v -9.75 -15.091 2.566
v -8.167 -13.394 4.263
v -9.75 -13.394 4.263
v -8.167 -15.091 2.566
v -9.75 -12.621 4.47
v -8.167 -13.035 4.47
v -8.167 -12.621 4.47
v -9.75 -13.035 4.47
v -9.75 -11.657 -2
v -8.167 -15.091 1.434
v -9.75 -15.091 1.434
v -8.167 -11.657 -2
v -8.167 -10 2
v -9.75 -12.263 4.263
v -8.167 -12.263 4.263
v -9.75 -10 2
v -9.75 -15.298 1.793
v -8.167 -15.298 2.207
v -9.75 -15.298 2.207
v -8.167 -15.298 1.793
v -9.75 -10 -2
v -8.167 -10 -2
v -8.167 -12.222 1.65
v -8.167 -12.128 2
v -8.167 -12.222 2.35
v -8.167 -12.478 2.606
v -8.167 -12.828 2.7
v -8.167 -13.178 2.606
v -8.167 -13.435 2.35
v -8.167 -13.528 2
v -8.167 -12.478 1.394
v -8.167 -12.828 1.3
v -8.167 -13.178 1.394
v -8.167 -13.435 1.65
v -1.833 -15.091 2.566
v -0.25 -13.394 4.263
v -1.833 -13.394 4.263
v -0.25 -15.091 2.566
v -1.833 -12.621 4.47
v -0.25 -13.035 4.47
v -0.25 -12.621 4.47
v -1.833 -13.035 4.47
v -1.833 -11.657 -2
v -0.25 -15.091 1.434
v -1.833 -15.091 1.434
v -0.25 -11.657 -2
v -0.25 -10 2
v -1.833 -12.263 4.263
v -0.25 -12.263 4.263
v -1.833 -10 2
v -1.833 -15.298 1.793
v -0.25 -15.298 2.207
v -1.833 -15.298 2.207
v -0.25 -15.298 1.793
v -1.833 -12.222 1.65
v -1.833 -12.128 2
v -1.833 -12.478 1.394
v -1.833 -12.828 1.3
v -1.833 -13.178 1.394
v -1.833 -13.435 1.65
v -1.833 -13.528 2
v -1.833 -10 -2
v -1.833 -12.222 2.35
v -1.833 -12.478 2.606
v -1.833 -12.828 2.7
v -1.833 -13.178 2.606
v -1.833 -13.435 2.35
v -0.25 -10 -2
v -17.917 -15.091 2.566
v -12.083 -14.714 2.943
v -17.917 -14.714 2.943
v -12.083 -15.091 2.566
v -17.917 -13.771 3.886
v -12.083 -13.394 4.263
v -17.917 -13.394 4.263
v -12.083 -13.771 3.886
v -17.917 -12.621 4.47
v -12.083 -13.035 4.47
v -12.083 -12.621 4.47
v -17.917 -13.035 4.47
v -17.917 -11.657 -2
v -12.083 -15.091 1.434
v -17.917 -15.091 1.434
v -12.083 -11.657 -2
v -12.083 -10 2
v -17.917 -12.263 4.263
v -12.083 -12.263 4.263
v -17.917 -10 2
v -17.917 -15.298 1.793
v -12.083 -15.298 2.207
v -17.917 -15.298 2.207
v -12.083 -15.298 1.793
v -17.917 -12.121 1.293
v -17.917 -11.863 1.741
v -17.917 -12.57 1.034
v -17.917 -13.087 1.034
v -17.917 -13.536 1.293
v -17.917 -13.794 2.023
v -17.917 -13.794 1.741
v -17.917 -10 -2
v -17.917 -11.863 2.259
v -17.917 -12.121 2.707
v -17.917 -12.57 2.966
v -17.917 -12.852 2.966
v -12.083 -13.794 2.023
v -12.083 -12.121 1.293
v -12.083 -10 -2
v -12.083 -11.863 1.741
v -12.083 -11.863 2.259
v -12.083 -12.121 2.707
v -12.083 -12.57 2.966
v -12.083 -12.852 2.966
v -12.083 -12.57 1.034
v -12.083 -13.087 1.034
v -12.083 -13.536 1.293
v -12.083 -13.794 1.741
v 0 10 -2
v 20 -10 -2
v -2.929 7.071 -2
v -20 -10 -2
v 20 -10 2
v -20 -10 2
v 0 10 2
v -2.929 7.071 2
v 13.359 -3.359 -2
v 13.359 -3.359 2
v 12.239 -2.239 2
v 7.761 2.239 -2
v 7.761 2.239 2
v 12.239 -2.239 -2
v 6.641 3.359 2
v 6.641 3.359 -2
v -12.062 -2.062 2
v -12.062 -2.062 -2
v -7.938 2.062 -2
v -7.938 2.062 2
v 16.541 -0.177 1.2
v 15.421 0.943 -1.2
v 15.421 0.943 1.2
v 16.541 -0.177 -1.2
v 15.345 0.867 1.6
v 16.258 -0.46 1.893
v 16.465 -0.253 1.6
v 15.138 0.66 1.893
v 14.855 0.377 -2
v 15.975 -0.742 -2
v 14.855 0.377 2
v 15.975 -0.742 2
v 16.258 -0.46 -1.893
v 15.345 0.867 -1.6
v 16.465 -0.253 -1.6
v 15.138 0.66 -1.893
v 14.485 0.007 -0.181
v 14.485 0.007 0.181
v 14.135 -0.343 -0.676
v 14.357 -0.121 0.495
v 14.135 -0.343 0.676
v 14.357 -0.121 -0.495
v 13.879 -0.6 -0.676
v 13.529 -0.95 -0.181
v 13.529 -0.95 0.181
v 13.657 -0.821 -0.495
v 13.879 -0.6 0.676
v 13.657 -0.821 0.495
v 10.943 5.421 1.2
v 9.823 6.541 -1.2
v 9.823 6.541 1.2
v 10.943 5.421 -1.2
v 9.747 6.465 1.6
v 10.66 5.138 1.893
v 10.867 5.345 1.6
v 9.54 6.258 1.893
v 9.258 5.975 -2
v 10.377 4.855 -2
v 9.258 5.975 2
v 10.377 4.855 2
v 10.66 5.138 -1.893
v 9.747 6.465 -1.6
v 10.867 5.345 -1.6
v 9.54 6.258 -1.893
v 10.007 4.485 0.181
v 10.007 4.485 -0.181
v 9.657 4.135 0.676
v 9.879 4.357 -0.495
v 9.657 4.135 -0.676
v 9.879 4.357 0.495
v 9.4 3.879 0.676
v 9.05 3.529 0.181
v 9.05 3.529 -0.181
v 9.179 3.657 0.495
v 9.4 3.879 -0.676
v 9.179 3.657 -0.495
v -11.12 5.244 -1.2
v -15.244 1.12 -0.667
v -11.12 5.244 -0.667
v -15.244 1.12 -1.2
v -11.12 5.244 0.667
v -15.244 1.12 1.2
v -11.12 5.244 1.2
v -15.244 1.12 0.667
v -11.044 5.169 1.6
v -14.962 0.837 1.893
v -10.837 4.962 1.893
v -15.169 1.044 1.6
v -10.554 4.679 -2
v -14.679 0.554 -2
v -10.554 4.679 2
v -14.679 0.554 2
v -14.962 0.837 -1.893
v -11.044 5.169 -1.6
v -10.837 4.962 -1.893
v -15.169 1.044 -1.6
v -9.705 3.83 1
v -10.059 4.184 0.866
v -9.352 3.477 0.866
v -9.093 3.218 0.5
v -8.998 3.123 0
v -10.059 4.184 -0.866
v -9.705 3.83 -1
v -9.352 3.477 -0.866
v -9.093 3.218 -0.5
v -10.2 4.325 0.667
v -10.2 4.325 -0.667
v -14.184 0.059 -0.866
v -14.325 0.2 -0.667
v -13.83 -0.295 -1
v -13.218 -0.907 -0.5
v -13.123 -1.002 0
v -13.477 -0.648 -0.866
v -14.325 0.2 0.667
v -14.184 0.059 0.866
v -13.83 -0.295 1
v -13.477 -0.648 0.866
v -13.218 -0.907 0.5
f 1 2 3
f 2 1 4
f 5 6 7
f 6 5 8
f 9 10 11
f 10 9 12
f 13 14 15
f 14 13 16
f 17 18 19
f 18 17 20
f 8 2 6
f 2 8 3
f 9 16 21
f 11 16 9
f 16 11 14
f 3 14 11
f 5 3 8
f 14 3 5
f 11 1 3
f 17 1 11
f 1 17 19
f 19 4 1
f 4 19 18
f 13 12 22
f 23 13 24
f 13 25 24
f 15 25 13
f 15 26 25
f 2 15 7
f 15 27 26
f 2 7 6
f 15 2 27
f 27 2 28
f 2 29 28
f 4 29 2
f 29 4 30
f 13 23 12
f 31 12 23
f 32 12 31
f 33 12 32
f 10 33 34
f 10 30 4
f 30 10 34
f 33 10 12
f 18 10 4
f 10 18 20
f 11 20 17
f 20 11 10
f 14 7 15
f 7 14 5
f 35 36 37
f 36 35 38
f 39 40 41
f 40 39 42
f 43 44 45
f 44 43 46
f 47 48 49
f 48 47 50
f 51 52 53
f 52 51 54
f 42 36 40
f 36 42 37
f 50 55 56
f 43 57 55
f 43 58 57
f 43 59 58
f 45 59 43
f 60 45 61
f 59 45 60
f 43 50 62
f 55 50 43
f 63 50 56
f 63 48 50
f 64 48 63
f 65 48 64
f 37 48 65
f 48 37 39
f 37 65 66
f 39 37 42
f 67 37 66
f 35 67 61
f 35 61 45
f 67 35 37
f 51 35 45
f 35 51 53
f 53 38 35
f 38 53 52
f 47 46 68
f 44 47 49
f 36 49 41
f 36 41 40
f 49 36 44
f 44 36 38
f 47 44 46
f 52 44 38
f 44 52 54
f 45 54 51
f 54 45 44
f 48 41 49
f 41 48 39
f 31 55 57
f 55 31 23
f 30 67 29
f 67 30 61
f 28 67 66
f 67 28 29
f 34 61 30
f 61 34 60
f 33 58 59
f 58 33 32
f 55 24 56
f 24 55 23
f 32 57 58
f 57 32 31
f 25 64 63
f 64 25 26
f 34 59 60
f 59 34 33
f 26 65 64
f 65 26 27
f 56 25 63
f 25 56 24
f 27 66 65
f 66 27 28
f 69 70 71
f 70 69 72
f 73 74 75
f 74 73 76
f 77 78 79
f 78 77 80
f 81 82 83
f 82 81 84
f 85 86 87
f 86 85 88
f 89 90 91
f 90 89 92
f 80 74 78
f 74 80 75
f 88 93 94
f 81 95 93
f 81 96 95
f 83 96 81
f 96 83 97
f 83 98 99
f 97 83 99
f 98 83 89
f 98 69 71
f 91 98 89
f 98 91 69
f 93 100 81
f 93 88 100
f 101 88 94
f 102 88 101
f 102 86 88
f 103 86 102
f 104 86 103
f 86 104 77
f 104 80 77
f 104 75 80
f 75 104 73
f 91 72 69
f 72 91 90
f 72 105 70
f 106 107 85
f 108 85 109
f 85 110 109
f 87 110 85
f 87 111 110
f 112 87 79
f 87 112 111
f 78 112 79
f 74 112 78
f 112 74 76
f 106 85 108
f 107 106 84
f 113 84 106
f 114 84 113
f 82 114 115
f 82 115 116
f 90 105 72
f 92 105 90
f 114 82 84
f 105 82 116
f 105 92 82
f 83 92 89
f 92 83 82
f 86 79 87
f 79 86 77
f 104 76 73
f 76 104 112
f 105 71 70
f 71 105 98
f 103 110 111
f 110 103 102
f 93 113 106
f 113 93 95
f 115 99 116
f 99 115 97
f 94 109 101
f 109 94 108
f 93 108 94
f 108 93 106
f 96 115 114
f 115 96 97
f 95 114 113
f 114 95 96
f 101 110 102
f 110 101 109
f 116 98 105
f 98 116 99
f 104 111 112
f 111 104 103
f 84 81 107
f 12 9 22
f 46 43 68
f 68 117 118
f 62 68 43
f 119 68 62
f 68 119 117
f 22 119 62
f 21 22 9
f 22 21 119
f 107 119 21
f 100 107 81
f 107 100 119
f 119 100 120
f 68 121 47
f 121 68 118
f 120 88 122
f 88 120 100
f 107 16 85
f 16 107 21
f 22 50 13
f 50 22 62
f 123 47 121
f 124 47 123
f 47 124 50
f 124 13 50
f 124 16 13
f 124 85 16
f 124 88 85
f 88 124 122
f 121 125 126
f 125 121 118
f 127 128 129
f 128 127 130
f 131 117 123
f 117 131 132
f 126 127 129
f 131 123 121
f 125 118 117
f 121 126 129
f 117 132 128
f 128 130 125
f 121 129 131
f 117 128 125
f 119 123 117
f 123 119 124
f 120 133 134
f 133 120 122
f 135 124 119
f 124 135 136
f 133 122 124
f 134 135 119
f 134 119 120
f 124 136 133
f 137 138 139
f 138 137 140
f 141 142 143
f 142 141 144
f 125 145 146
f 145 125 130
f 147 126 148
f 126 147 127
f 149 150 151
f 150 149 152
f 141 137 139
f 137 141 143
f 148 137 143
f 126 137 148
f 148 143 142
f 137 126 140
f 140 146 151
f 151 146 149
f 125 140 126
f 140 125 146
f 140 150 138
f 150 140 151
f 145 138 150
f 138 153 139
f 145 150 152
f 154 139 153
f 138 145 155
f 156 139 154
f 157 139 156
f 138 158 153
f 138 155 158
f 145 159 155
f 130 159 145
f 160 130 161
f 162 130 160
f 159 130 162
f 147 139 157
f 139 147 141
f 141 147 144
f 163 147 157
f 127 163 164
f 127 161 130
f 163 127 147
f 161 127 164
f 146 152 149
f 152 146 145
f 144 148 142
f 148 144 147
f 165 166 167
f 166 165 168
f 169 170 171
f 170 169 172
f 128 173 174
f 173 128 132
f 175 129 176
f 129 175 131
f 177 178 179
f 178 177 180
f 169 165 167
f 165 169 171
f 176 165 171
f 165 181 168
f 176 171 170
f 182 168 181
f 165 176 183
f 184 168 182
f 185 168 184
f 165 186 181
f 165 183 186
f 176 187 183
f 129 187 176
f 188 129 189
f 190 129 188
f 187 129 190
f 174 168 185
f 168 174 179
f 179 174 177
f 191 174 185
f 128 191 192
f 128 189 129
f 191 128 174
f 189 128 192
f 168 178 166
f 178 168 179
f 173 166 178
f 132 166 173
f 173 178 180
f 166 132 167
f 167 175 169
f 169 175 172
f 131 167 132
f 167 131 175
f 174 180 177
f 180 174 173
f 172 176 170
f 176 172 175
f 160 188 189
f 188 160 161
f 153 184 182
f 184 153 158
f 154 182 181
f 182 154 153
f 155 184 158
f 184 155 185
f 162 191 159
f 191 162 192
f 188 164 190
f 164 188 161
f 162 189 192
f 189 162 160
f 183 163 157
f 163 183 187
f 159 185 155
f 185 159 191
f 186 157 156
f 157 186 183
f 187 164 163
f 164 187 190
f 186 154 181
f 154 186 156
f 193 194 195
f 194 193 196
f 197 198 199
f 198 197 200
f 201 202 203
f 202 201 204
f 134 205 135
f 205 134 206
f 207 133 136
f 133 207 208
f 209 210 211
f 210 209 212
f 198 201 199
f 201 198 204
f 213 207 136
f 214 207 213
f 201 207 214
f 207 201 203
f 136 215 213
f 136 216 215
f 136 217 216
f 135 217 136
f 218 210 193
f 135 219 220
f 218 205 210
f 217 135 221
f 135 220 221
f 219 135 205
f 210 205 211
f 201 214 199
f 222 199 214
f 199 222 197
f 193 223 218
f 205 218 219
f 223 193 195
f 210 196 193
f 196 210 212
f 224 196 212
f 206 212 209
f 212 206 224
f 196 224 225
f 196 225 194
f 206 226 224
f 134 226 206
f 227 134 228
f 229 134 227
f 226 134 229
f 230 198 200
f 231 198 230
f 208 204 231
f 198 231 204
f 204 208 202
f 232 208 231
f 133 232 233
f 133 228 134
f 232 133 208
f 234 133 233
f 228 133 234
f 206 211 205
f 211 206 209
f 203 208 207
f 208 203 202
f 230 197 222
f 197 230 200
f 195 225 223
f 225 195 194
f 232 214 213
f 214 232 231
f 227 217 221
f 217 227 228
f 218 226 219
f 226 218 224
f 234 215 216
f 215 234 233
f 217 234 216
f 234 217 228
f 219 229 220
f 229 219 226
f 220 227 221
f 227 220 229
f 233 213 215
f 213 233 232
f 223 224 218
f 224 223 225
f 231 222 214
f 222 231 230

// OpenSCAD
// file: clip.scad
include <vars.scad>;

module clip(){
  tollerance = 0.9;
  max_width = JOINT_WIDTH - JOINT_TOLLERANCE; 
  hinge_side = max_width/6;
  width = (max_width-hinge_side*2) - JOINT_TOLLERANCE;
  size = TRIANGLE_THICKNESS;
  corner = 0.8;

  echo("clip width:", width);
    
  difference() {
    hull() {
      translate([0, size, 0]) {
        cube([width, size, size], center=true);
      }
      translate([0, -size/2+corner, size/2-corner]) {
        rotate(90, [0, 1, 0]) {
          cylinder(h=width, r=corner, center=true);
        }
      }
      translate([0, -size/2+corner, -size/2+corner]) {
        rotate(90, [0, 1, 0]) {
          cylinder(h=width, r=corner, center=true);
        }
      }
    }
    translate([0, -size/2, 0]) {
      cube([JOINT_WIDTH, size, size/3], center=true);
    }
    rotate(90, [0, 1, 0]) {
      cylinder(h=JOINT_WIDTH, r=size/2*1/2, center=true);
    }
  }
}

color(COLOR, 1) {
  clip();
}
// file: hinge.scad
include <vars.scad>;

FACE_ANGLE = 360/$fn;

module hinge(){
  width = JOINT_WIDTH-JOINT_TOLLERANCE;
  size = TRIANGLE_THICKNESS;
  side = width/6;
  corner = 0.8;
  
  echo("hinge widths (all, side, cylinder):", width, side, width-side*2);
    
  hull() {
    translate([-(width/2)+side/2, size, 0]) {
      cube([side, size, size], center=true);
    }
    translate([-(width/2)+side/2, -size/2+corner, size/2-corner]) {
      rotate(90, [0, 1, 0]) {
        cylinder(h=side, r=corner, center=true);
      }
    }
    translate([-(width/2)+side/2, -size/2+corner, -size/2+corner]) {
      rotate(90, [0, 1, 0]) {
        cylinder(h=side, r=corner, center=true);
      }
    }
  }
  hull() {
    translate([width/2-side/2, size, 0]) {
      cube([side, size, size], center=true);
    } 
    translate([width/2-side/2, -size/2+corner, size/2-corner]) {
      rotate(90, [0, 1, 0]) {
        cylinder(h=side, r=corner, center=true);
      }
    }
    translate([width/2-side/2, -size/2+corner, -size/2+corner]) {
      rotate(90, [0, 1, 0]) {
        cylinder(h=side, r=corner, center=true);
      }
    }
  }
  rotate(FACE_ANGLE/2, [1, 0, 0]) { // Required so that cylinder face is parallel to plane
    rotate(90, [0, 1, 0]) {
      cylinder(h=width, r=size/2*0.7/2, center=true);
    }
  }
} 

color(COLOR, 1) {
  hinge();
}
// file: triangle.scad
include <vars.scad>;

module triangle(){
  translate([0, 0, -TRIANGLE_THICKNESS/2]) {
    linear_extrude(TRIANGLE_THICKNESS) {
      polygon([[-TRIANGLE_SIDE/2, -TRIANGLE_SIDE/4], [0, TRIANGLE_SIDE/4], [TRIANGLE_SIDE/2, -TRIANGLE_SIDE/4]]);
    }
  }
}

color(COLOR, 1) {
  triangle();
}
// file: vars.scad
$fn = 12;
COLOR = "LimeGreen"; // Model color
TRIANGLE_SIDE = 40; // Triangle side size
TRIANGLE_THICKNESS = 4; // Triagle thickness
JOINT_WIDTH = TRIANGLE_SIDE/4; // Max width for clip/hinge
JOINT_TOLLERANCE = 0.5; // Fixed joint tollerance
// main file
include <vars.scad>;
use <triangle.scad>;
use <hinge.scad>;
use <clip.scad>;

module part() {
  difference() {
    union(){
      triangle();
      translate([-TRIANGLE_SIDE/8, -TRIANGLE_SIDE/4, 0]) {
        translate([0, 0, TRIANGLE_THICKNESS/2]) {
          rotate(-45, [1, 0, 0]) {
            translate([0, -TRIANGLE_THICKNESS/2, -TRIANGLE_THICKNESS/2]) {
              hinge();
            }
          }
        }
      }
      translate([-TRIANGLE_SIDE/8*3, -TRIANGLE_SIDE/4, 0]) {
        translate([0, 0, TRIANGLE_THICKNESS/2]) {
          rotate(-45, [1, 0, 0]) {
            translate([0, -TRIANGLE_THICKNESS/2, -TRIANGLE_THICKNESS/2]) {
              clip();
            }
          }
        }
      }
    }
    translate([0, 0, -TRIANGLE_THICKNESS]) {
      cube([TRIANGLE_SIDE*2, TRIANGLE_SIDE*2, TRIANGLE_THICKNESS], center=true);
    }
    translate([-TRIANGLE_SIDE/4, 0, 0]) {
      rotate(-45, [0,0,1]){
        translate([-TRIANGLE_THICKNESS, -TRIANGLE_SIDE+TRIANGLE_SIDE/4, -TRIANGLE_THICKNESS/2]) {
          cube([TRIANGLE_THICKNESS, TRIANGLE_SIDE, TRIANGLE_THICKNESS], center=false);
        }
      }
    }
  }
  translate([TRIANGLE_SIDE/4, 0, 0]) {
    rotate(135, [0, 0, 1]) {
      translate([0, -TRIANGLE_THICKNESS/2-JOINT_TOLLERANCE, 0]) {
        hinge();
      }
    }
  }
  translate([-TRIANGLE_SIDE/4, 0, 0]) {
    rotate(-135, [0, 0, 1]) {
      translate([0, -TRIANGLE_THICKNESS/2-JOINT_TOLLERANCE, 0]) {
        clip();
      }
    }
  }
}

color(COLOR, 1) {
  part();
}
